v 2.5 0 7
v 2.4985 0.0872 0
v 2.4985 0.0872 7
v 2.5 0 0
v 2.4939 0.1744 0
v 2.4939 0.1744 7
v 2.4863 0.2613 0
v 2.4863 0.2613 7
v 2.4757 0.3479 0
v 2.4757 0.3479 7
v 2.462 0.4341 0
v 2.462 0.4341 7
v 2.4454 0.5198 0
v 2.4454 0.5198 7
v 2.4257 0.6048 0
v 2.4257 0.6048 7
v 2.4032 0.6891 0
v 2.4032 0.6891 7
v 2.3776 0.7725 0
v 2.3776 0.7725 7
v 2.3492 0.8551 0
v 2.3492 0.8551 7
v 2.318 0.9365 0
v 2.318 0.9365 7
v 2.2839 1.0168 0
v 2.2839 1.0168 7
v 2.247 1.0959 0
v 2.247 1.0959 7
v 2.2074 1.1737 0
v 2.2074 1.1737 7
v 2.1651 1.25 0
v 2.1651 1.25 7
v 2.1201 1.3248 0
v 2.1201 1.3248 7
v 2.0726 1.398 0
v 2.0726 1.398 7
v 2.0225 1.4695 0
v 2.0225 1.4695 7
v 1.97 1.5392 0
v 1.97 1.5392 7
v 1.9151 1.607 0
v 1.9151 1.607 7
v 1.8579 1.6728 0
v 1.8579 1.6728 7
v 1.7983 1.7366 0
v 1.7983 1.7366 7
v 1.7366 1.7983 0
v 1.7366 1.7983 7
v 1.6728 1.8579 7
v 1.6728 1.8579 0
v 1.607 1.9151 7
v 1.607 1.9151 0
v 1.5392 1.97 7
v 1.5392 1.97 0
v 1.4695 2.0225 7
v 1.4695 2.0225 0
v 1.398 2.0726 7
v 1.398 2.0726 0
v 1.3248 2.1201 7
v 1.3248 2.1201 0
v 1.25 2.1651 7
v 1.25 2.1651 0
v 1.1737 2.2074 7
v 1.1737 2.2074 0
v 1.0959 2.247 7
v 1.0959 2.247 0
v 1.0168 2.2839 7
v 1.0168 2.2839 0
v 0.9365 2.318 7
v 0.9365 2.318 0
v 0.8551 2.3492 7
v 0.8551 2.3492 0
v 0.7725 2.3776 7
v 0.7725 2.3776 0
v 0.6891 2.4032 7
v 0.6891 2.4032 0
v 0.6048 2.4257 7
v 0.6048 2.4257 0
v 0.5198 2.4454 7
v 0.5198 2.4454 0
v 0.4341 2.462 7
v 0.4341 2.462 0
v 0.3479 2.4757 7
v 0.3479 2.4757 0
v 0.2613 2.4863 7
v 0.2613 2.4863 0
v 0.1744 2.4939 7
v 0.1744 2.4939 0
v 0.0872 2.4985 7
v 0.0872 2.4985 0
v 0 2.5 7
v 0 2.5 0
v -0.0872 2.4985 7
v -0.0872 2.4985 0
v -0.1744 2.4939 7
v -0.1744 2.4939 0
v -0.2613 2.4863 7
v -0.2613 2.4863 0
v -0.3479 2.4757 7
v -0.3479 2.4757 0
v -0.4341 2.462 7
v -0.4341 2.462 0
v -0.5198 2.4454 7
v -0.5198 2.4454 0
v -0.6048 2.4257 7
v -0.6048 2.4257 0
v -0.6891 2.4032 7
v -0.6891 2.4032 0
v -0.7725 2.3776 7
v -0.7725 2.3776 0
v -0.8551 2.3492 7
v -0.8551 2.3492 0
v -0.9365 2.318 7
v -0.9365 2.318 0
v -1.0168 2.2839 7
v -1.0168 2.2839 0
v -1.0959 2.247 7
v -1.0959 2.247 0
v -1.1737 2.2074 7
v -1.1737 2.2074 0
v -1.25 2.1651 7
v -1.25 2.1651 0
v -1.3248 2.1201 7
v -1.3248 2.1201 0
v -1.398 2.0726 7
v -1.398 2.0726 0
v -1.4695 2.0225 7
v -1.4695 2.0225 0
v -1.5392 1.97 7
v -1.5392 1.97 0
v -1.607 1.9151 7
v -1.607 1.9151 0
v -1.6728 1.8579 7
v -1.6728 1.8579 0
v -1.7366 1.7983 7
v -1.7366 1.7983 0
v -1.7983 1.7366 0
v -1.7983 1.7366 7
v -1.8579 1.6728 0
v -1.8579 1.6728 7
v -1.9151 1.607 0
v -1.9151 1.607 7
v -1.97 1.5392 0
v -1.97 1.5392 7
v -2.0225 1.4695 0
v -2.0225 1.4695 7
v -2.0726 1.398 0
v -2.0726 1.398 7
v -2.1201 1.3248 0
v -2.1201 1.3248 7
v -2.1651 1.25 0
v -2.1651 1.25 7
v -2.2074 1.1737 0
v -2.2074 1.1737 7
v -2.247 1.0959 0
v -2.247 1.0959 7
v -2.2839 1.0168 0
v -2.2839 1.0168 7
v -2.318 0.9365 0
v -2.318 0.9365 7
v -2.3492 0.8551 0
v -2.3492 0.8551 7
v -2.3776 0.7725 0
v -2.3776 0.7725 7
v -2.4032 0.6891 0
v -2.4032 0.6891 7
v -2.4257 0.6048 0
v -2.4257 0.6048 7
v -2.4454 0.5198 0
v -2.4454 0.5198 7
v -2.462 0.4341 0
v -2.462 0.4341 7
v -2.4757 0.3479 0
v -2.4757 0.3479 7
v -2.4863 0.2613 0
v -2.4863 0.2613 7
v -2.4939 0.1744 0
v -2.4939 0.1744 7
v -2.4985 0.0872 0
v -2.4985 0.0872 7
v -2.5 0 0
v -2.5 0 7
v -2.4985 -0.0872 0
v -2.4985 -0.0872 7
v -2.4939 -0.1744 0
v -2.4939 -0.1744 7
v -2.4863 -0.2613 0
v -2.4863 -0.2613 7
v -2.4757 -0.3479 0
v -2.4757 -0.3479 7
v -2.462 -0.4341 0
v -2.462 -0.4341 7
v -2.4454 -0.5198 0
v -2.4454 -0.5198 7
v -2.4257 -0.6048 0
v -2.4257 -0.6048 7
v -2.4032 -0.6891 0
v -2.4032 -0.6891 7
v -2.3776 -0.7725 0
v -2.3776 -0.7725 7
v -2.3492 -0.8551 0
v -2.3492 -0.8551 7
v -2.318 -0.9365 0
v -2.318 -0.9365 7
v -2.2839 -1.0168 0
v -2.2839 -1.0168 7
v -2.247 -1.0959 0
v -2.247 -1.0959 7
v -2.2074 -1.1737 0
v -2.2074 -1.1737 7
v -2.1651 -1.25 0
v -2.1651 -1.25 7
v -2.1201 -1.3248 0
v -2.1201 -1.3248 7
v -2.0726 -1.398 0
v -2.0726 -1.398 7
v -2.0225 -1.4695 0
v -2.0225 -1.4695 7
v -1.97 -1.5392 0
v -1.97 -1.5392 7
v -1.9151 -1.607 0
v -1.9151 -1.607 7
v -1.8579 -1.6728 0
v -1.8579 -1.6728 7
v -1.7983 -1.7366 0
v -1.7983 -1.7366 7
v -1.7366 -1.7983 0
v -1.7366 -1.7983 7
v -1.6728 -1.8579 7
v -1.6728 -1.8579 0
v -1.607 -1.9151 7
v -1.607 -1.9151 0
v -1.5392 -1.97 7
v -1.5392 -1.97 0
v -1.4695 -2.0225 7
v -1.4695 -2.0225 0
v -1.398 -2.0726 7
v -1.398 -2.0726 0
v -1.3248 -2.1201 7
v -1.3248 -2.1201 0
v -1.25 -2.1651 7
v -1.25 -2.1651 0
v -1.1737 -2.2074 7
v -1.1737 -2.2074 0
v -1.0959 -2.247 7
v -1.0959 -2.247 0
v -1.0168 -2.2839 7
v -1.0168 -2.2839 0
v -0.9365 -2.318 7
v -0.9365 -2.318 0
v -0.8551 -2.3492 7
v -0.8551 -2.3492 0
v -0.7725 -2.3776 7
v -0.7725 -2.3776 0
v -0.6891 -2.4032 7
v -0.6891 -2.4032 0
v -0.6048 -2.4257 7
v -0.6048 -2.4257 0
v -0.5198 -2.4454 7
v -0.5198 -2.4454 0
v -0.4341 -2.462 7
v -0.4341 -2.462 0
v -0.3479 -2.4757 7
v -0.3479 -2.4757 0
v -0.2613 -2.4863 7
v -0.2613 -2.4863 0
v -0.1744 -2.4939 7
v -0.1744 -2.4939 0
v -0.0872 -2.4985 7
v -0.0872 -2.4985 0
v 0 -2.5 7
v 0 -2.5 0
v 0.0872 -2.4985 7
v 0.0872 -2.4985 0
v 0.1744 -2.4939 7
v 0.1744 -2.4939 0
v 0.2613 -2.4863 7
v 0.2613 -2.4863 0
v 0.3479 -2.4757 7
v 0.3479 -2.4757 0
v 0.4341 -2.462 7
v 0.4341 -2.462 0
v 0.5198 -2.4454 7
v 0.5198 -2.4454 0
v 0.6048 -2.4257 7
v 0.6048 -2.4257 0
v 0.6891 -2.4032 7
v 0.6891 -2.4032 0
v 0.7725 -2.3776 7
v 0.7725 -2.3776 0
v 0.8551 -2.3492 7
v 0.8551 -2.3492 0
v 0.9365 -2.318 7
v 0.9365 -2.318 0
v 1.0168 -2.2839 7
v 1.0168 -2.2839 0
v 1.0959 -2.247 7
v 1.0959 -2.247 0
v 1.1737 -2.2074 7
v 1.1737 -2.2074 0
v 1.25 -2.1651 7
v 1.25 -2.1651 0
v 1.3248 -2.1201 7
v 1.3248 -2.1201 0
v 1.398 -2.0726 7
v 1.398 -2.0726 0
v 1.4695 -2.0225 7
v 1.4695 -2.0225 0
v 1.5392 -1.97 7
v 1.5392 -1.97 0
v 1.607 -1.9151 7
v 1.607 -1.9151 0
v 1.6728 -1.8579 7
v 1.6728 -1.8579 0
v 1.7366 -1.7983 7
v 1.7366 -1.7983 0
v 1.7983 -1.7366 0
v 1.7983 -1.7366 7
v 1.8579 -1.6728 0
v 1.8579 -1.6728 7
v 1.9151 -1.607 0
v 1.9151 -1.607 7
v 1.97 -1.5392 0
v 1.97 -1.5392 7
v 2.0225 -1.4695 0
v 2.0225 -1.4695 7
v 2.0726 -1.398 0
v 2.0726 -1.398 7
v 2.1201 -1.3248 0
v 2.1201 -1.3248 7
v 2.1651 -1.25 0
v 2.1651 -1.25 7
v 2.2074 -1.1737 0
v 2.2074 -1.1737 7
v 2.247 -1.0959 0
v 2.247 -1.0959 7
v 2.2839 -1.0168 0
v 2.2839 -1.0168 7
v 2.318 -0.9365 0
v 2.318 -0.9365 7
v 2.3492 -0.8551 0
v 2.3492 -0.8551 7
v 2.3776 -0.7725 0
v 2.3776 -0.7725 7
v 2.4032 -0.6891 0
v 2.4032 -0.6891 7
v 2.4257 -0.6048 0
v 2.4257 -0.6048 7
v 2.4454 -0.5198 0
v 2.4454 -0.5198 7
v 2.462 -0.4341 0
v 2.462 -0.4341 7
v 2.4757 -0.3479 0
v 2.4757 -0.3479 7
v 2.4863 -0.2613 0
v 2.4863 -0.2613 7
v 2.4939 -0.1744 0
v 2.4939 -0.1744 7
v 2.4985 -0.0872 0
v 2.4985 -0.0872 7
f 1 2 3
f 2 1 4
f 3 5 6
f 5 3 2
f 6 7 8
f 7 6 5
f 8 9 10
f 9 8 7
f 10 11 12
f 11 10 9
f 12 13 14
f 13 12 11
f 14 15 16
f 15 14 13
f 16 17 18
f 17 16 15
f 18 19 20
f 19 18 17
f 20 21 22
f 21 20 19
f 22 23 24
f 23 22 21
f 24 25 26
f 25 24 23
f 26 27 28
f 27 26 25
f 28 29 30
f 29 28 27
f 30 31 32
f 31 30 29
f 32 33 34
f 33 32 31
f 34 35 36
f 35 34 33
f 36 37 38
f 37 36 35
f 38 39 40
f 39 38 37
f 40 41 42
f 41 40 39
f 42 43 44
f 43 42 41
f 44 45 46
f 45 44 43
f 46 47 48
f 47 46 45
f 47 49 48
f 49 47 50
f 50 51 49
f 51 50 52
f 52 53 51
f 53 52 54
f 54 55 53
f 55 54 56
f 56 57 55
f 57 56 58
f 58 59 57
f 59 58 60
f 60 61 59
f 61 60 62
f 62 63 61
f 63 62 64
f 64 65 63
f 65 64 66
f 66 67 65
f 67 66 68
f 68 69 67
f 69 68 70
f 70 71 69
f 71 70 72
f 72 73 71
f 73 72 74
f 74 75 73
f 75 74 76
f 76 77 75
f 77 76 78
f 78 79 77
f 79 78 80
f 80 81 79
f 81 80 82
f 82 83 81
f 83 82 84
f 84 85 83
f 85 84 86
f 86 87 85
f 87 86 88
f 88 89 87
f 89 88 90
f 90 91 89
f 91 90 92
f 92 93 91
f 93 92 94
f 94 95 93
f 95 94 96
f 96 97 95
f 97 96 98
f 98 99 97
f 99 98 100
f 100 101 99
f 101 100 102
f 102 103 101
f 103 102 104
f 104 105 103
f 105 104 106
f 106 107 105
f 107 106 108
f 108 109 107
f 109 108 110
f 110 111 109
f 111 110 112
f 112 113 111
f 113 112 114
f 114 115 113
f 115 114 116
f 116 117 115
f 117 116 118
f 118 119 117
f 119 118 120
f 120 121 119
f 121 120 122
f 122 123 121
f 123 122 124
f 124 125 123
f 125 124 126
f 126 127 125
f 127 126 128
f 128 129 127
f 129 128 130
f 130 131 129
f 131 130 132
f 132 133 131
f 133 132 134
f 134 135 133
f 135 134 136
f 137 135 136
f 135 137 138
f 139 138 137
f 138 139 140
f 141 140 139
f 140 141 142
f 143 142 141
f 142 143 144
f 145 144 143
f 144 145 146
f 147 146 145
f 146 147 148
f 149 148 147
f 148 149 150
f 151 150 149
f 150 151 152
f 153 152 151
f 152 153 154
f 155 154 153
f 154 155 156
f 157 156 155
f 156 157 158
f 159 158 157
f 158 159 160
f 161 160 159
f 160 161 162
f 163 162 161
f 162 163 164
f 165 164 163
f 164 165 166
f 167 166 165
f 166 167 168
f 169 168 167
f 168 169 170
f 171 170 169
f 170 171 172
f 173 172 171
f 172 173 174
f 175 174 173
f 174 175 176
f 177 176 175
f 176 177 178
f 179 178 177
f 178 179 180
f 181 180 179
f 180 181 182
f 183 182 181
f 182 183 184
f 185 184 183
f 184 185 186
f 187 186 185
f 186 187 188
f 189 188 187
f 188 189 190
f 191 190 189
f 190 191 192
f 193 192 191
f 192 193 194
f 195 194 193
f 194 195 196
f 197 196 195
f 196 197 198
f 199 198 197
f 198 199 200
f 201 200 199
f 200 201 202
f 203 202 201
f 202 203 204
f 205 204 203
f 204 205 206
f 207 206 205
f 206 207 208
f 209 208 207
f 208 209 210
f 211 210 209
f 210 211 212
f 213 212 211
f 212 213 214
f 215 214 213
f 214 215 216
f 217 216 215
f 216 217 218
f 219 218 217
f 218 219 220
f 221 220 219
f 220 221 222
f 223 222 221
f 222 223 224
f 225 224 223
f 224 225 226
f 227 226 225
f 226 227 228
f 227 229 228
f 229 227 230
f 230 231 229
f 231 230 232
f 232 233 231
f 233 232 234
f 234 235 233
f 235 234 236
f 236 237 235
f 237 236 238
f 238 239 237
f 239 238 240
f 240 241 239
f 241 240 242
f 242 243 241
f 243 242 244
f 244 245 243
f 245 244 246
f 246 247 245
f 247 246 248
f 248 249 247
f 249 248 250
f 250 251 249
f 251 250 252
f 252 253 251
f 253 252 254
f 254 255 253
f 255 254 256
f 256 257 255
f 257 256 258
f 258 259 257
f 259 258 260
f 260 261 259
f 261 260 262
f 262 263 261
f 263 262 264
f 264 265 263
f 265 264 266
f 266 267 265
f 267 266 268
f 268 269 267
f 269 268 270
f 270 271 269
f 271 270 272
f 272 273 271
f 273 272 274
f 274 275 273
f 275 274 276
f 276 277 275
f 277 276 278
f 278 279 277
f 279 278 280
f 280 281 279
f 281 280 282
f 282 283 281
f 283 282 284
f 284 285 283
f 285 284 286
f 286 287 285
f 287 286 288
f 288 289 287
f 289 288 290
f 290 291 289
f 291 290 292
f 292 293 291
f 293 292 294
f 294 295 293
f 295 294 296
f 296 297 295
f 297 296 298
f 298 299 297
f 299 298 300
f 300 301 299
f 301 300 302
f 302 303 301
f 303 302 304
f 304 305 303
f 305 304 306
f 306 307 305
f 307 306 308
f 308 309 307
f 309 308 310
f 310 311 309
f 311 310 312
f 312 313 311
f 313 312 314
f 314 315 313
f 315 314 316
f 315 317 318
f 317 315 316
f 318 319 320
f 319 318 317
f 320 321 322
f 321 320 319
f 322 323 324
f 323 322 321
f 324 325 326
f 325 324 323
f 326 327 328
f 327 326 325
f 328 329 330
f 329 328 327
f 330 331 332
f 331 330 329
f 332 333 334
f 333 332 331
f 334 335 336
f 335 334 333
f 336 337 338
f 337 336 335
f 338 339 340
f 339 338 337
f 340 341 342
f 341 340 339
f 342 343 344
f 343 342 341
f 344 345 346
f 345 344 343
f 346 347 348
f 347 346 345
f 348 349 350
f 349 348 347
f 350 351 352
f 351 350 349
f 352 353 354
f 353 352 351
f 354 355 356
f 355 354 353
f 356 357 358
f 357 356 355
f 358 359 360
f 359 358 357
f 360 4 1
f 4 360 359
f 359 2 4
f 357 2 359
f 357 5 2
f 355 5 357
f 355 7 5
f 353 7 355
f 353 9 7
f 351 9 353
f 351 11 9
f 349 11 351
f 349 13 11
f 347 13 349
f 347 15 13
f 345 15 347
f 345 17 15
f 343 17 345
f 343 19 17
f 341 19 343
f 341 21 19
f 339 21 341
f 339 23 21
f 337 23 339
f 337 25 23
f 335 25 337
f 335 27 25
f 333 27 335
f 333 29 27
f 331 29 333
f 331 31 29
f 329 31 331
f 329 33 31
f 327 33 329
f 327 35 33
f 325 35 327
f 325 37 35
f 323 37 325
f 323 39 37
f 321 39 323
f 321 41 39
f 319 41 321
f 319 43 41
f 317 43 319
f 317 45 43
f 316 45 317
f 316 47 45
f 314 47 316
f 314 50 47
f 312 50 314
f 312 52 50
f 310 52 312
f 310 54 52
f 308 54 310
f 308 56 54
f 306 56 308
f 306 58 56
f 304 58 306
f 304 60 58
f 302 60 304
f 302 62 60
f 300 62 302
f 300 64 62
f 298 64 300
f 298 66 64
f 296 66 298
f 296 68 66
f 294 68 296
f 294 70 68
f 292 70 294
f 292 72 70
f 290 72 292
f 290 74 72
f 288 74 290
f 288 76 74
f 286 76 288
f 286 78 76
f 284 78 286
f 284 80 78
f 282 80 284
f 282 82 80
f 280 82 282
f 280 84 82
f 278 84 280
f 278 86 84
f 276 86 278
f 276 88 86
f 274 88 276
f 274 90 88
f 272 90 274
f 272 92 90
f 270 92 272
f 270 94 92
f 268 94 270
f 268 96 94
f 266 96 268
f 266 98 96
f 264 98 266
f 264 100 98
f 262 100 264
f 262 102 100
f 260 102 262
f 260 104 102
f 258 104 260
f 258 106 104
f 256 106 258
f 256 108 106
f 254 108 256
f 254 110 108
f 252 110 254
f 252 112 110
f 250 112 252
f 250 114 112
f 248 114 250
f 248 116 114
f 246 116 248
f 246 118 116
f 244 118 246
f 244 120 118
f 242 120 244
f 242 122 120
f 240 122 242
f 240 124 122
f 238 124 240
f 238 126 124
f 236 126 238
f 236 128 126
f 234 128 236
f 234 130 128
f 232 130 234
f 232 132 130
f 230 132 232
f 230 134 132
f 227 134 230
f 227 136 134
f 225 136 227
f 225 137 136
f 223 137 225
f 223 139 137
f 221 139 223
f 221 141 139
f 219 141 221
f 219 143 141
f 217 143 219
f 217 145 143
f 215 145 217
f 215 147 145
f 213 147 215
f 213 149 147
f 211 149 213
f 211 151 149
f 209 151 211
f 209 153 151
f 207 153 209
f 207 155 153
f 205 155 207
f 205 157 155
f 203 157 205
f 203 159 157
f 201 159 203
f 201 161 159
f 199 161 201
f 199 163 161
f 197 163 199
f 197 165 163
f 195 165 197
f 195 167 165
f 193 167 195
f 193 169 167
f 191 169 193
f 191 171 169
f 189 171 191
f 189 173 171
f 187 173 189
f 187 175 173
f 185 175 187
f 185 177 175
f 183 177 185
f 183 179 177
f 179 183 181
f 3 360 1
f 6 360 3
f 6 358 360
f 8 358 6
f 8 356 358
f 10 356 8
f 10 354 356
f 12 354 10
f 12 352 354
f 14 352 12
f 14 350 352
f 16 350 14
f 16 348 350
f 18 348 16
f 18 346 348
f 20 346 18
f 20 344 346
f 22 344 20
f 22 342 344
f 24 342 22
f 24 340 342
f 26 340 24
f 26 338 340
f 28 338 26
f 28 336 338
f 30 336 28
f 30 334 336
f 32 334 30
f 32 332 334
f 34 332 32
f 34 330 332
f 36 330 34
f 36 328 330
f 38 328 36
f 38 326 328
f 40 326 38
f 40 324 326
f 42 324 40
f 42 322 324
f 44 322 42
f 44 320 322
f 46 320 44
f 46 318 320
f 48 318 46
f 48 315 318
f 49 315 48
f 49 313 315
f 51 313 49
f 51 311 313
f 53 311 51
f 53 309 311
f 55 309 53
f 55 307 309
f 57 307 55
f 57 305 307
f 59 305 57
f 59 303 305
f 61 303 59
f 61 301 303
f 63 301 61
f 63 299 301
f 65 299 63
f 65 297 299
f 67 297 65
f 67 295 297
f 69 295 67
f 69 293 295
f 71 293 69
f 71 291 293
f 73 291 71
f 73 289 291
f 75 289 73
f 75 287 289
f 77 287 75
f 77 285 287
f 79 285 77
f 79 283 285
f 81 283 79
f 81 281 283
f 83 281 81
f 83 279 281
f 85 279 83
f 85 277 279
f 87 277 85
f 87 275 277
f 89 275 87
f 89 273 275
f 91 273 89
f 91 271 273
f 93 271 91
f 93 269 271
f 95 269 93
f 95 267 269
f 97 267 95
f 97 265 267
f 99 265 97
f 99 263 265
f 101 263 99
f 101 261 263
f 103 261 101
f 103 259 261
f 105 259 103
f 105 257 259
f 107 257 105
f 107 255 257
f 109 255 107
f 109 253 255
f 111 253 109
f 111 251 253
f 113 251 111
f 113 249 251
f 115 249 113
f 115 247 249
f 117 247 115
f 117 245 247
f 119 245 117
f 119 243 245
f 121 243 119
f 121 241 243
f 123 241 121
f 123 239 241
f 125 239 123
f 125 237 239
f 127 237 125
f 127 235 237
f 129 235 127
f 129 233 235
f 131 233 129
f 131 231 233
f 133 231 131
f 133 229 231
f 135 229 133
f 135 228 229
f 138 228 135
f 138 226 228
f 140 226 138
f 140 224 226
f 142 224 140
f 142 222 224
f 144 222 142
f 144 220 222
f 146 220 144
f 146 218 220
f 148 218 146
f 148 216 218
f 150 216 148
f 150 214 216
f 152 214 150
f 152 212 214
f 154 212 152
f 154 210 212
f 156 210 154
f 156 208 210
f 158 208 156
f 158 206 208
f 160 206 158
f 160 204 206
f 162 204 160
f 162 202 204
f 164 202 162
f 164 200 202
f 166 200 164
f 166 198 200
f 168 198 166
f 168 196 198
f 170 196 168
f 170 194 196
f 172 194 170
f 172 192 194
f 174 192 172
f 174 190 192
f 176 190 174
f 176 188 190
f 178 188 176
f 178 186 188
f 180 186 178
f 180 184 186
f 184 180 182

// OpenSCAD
DIAMETRE = 5 * 1;
HAUTEUR = 7 * 1;

$fs = 0.01;
$fa = 2;

cylinder(h =HAUTEUR,r =DIAMETRE/2);
